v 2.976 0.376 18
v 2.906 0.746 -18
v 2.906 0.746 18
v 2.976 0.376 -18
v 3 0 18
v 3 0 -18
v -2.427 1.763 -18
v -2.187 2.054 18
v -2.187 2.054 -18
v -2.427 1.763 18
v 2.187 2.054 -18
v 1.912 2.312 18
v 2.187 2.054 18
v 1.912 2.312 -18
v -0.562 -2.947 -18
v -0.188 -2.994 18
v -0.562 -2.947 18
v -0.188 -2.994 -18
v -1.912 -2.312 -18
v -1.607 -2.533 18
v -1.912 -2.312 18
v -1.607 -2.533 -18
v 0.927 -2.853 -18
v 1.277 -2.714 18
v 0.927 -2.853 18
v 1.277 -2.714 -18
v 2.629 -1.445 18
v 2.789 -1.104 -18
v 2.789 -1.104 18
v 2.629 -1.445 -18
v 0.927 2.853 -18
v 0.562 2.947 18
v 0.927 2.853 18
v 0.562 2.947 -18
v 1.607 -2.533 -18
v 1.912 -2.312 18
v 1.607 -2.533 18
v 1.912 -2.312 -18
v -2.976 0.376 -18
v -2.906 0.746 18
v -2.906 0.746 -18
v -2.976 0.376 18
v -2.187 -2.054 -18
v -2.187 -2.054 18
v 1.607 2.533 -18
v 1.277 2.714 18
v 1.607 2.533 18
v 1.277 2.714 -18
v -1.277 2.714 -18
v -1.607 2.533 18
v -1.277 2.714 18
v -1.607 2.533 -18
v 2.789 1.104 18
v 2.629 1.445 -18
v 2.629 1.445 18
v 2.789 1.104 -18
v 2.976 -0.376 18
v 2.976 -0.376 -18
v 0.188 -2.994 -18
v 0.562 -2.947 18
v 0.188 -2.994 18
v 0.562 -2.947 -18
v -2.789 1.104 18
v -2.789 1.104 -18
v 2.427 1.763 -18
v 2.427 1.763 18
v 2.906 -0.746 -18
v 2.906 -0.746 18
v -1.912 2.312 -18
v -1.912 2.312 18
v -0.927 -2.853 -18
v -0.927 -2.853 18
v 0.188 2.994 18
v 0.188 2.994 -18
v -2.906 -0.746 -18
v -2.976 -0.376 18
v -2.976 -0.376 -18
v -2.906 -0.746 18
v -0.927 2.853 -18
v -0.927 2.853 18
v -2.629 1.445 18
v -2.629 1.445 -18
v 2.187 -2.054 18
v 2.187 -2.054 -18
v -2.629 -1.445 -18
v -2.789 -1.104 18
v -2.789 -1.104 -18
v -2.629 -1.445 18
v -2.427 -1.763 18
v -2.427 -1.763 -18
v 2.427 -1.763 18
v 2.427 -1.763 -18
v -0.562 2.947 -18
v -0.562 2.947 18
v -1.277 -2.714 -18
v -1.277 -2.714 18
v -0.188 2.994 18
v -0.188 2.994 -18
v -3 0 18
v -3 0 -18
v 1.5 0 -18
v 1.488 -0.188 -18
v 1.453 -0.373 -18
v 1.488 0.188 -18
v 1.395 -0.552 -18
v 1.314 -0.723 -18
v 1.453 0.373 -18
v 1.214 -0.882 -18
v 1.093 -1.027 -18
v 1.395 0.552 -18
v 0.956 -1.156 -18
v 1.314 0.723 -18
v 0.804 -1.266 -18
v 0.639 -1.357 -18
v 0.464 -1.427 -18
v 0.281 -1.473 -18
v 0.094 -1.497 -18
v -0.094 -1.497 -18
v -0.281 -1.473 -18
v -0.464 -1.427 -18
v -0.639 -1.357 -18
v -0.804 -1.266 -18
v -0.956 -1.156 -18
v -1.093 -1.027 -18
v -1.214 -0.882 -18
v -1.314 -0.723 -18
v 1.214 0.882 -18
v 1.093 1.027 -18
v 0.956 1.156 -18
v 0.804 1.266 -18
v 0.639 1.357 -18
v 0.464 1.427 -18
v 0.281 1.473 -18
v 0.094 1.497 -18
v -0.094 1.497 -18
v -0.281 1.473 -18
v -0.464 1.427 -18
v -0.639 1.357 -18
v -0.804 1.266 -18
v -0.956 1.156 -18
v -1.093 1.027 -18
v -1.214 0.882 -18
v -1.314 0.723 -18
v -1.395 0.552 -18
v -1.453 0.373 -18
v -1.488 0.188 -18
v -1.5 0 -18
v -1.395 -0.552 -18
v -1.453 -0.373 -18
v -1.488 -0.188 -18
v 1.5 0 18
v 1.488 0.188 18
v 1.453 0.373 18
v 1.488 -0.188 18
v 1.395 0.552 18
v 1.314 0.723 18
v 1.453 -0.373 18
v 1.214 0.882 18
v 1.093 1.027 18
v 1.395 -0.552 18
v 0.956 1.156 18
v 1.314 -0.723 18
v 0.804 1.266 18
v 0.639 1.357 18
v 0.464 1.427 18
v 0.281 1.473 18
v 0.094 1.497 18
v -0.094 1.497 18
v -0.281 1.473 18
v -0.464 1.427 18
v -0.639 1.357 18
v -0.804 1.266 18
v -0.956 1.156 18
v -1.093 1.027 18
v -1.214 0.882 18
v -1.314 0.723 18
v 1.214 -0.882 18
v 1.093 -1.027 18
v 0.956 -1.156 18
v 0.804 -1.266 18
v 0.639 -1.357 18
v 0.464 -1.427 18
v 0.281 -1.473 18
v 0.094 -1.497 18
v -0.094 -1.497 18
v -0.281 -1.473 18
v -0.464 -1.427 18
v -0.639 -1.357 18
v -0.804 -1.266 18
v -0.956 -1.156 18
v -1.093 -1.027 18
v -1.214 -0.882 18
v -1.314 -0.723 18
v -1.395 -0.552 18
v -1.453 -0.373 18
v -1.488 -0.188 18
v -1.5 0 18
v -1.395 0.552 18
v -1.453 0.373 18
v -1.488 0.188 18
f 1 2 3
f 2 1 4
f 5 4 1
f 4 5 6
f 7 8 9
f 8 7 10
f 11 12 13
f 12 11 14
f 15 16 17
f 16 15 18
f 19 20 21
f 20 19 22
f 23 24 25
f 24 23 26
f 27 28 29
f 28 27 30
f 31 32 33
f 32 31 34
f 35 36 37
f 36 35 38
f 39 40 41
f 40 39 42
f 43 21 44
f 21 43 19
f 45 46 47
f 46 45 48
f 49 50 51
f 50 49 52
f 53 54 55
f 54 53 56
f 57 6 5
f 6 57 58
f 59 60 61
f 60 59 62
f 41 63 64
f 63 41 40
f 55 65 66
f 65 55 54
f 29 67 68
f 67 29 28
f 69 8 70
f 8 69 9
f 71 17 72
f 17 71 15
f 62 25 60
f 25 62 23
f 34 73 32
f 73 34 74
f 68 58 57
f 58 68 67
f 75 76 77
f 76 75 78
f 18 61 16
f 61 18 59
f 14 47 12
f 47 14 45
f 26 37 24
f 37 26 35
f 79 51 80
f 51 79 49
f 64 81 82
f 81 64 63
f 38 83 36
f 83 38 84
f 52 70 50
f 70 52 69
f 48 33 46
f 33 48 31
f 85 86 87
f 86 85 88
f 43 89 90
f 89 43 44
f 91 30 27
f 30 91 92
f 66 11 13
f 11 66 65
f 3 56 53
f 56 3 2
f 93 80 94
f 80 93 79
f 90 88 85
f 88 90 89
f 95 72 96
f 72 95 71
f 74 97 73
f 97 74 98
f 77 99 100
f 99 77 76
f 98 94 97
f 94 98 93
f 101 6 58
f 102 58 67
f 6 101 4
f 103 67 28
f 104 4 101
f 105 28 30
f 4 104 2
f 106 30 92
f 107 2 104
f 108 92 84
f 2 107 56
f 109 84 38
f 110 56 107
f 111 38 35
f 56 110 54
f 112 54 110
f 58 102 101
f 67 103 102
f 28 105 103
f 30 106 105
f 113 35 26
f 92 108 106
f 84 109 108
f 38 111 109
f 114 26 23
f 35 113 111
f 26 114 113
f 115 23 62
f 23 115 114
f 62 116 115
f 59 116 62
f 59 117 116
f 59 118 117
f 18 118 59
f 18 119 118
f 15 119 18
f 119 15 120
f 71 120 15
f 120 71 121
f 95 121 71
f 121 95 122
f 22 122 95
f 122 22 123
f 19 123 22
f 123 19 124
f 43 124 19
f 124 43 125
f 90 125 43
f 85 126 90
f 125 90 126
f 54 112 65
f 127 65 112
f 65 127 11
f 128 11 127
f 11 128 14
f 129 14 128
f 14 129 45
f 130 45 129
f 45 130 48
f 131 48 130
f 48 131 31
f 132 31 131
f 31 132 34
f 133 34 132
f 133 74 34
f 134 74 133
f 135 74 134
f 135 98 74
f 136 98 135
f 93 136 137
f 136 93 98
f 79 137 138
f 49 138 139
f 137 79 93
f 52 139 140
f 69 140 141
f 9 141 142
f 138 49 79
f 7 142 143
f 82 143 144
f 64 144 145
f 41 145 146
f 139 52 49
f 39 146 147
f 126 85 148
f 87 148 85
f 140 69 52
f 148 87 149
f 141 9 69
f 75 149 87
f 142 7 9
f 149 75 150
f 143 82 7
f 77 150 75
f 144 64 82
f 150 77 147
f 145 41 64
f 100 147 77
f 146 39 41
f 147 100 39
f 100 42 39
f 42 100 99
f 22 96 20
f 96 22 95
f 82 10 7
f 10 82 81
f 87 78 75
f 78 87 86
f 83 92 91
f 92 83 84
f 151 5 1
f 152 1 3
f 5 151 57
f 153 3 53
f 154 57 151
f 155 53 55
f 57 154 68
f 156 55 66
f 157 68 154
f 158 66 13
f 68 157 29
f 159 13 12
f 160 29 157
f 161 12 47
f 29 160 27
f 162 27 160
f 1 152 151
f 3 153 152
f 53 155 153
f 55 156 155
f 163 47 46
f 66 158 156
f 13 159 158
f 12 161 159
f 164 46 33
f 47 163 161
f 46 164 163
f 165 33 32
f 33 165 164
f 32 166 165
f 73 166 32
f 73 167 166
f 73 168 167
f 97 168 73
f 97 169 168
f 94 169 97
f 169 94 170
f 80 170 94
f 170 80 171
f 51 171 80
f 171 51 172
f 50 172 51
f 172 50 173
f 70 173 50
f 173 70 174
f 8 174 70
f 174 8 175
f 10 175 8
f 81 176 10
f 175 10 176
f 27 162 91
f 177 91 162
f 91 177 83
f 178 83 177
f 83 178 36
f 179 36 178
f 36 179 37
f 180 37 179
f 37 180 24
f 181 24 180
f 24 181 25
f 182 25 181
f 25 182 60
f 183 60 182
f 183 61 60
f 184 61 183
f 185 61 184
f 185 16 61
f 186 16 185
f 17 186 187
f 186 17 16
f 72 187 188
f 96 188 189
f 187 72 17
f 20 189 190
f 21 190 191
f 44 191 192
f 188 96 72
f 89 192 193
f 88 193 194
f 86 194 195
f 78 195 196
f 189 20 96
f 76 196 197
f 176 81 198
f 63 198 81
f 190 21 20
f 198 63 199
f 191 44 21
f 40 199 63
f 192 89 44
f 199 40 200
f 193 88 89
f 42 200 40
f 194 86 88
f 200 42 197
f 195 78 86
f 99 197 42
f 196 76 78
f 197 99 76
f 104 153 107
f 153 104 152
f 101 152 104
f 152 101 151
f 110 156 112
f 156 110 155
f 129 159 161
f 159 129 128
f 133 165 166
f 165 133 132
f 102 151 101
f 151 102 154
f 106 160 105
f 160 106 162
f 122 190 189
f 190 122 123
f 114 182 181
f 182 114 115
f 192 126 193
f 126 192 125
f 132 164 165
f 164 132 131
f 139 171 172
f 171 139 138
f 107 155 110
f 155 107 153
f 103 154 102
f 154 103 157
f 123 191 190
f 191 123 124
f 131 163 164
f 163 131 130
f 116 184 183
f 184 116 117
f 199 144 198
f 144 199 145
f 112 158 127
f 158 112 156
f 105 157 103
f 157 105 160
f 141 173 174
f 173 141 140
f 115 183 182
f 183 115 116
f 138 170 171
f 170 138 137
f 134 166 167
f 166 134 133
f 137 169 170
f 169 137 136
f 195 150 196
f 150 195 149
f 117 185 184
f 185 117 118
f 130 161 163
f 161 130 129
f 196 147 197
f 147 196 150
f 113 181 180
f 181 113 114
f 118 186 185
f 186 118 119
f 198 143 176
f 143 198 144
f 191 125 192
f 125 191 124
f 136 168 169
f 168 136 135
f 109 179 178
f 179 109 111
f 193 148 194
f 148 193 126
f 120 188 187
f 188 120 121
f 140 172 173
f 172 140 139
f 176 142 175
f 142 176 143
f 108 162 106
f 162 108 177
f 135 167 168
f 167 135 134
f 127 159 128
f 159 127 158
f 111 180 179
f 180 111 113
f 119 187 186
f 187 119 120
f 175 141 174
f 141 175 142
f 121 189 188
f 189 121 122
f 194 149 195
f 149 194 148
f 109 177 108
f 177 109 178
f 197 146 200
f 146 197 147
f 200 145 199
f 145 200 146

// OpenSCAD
$fn = 50;


difference() {
	union() {
		translate(v = [0, 0, -18.0000000000]) {
			cylinder(h = 36, r = 3.0000000000);
		}
	}
	union() {
		translate(v = [0, 0, -100.0000000000]) {
			cylinder(h = 200, r = 1.5000000000);
		}
	}
}
